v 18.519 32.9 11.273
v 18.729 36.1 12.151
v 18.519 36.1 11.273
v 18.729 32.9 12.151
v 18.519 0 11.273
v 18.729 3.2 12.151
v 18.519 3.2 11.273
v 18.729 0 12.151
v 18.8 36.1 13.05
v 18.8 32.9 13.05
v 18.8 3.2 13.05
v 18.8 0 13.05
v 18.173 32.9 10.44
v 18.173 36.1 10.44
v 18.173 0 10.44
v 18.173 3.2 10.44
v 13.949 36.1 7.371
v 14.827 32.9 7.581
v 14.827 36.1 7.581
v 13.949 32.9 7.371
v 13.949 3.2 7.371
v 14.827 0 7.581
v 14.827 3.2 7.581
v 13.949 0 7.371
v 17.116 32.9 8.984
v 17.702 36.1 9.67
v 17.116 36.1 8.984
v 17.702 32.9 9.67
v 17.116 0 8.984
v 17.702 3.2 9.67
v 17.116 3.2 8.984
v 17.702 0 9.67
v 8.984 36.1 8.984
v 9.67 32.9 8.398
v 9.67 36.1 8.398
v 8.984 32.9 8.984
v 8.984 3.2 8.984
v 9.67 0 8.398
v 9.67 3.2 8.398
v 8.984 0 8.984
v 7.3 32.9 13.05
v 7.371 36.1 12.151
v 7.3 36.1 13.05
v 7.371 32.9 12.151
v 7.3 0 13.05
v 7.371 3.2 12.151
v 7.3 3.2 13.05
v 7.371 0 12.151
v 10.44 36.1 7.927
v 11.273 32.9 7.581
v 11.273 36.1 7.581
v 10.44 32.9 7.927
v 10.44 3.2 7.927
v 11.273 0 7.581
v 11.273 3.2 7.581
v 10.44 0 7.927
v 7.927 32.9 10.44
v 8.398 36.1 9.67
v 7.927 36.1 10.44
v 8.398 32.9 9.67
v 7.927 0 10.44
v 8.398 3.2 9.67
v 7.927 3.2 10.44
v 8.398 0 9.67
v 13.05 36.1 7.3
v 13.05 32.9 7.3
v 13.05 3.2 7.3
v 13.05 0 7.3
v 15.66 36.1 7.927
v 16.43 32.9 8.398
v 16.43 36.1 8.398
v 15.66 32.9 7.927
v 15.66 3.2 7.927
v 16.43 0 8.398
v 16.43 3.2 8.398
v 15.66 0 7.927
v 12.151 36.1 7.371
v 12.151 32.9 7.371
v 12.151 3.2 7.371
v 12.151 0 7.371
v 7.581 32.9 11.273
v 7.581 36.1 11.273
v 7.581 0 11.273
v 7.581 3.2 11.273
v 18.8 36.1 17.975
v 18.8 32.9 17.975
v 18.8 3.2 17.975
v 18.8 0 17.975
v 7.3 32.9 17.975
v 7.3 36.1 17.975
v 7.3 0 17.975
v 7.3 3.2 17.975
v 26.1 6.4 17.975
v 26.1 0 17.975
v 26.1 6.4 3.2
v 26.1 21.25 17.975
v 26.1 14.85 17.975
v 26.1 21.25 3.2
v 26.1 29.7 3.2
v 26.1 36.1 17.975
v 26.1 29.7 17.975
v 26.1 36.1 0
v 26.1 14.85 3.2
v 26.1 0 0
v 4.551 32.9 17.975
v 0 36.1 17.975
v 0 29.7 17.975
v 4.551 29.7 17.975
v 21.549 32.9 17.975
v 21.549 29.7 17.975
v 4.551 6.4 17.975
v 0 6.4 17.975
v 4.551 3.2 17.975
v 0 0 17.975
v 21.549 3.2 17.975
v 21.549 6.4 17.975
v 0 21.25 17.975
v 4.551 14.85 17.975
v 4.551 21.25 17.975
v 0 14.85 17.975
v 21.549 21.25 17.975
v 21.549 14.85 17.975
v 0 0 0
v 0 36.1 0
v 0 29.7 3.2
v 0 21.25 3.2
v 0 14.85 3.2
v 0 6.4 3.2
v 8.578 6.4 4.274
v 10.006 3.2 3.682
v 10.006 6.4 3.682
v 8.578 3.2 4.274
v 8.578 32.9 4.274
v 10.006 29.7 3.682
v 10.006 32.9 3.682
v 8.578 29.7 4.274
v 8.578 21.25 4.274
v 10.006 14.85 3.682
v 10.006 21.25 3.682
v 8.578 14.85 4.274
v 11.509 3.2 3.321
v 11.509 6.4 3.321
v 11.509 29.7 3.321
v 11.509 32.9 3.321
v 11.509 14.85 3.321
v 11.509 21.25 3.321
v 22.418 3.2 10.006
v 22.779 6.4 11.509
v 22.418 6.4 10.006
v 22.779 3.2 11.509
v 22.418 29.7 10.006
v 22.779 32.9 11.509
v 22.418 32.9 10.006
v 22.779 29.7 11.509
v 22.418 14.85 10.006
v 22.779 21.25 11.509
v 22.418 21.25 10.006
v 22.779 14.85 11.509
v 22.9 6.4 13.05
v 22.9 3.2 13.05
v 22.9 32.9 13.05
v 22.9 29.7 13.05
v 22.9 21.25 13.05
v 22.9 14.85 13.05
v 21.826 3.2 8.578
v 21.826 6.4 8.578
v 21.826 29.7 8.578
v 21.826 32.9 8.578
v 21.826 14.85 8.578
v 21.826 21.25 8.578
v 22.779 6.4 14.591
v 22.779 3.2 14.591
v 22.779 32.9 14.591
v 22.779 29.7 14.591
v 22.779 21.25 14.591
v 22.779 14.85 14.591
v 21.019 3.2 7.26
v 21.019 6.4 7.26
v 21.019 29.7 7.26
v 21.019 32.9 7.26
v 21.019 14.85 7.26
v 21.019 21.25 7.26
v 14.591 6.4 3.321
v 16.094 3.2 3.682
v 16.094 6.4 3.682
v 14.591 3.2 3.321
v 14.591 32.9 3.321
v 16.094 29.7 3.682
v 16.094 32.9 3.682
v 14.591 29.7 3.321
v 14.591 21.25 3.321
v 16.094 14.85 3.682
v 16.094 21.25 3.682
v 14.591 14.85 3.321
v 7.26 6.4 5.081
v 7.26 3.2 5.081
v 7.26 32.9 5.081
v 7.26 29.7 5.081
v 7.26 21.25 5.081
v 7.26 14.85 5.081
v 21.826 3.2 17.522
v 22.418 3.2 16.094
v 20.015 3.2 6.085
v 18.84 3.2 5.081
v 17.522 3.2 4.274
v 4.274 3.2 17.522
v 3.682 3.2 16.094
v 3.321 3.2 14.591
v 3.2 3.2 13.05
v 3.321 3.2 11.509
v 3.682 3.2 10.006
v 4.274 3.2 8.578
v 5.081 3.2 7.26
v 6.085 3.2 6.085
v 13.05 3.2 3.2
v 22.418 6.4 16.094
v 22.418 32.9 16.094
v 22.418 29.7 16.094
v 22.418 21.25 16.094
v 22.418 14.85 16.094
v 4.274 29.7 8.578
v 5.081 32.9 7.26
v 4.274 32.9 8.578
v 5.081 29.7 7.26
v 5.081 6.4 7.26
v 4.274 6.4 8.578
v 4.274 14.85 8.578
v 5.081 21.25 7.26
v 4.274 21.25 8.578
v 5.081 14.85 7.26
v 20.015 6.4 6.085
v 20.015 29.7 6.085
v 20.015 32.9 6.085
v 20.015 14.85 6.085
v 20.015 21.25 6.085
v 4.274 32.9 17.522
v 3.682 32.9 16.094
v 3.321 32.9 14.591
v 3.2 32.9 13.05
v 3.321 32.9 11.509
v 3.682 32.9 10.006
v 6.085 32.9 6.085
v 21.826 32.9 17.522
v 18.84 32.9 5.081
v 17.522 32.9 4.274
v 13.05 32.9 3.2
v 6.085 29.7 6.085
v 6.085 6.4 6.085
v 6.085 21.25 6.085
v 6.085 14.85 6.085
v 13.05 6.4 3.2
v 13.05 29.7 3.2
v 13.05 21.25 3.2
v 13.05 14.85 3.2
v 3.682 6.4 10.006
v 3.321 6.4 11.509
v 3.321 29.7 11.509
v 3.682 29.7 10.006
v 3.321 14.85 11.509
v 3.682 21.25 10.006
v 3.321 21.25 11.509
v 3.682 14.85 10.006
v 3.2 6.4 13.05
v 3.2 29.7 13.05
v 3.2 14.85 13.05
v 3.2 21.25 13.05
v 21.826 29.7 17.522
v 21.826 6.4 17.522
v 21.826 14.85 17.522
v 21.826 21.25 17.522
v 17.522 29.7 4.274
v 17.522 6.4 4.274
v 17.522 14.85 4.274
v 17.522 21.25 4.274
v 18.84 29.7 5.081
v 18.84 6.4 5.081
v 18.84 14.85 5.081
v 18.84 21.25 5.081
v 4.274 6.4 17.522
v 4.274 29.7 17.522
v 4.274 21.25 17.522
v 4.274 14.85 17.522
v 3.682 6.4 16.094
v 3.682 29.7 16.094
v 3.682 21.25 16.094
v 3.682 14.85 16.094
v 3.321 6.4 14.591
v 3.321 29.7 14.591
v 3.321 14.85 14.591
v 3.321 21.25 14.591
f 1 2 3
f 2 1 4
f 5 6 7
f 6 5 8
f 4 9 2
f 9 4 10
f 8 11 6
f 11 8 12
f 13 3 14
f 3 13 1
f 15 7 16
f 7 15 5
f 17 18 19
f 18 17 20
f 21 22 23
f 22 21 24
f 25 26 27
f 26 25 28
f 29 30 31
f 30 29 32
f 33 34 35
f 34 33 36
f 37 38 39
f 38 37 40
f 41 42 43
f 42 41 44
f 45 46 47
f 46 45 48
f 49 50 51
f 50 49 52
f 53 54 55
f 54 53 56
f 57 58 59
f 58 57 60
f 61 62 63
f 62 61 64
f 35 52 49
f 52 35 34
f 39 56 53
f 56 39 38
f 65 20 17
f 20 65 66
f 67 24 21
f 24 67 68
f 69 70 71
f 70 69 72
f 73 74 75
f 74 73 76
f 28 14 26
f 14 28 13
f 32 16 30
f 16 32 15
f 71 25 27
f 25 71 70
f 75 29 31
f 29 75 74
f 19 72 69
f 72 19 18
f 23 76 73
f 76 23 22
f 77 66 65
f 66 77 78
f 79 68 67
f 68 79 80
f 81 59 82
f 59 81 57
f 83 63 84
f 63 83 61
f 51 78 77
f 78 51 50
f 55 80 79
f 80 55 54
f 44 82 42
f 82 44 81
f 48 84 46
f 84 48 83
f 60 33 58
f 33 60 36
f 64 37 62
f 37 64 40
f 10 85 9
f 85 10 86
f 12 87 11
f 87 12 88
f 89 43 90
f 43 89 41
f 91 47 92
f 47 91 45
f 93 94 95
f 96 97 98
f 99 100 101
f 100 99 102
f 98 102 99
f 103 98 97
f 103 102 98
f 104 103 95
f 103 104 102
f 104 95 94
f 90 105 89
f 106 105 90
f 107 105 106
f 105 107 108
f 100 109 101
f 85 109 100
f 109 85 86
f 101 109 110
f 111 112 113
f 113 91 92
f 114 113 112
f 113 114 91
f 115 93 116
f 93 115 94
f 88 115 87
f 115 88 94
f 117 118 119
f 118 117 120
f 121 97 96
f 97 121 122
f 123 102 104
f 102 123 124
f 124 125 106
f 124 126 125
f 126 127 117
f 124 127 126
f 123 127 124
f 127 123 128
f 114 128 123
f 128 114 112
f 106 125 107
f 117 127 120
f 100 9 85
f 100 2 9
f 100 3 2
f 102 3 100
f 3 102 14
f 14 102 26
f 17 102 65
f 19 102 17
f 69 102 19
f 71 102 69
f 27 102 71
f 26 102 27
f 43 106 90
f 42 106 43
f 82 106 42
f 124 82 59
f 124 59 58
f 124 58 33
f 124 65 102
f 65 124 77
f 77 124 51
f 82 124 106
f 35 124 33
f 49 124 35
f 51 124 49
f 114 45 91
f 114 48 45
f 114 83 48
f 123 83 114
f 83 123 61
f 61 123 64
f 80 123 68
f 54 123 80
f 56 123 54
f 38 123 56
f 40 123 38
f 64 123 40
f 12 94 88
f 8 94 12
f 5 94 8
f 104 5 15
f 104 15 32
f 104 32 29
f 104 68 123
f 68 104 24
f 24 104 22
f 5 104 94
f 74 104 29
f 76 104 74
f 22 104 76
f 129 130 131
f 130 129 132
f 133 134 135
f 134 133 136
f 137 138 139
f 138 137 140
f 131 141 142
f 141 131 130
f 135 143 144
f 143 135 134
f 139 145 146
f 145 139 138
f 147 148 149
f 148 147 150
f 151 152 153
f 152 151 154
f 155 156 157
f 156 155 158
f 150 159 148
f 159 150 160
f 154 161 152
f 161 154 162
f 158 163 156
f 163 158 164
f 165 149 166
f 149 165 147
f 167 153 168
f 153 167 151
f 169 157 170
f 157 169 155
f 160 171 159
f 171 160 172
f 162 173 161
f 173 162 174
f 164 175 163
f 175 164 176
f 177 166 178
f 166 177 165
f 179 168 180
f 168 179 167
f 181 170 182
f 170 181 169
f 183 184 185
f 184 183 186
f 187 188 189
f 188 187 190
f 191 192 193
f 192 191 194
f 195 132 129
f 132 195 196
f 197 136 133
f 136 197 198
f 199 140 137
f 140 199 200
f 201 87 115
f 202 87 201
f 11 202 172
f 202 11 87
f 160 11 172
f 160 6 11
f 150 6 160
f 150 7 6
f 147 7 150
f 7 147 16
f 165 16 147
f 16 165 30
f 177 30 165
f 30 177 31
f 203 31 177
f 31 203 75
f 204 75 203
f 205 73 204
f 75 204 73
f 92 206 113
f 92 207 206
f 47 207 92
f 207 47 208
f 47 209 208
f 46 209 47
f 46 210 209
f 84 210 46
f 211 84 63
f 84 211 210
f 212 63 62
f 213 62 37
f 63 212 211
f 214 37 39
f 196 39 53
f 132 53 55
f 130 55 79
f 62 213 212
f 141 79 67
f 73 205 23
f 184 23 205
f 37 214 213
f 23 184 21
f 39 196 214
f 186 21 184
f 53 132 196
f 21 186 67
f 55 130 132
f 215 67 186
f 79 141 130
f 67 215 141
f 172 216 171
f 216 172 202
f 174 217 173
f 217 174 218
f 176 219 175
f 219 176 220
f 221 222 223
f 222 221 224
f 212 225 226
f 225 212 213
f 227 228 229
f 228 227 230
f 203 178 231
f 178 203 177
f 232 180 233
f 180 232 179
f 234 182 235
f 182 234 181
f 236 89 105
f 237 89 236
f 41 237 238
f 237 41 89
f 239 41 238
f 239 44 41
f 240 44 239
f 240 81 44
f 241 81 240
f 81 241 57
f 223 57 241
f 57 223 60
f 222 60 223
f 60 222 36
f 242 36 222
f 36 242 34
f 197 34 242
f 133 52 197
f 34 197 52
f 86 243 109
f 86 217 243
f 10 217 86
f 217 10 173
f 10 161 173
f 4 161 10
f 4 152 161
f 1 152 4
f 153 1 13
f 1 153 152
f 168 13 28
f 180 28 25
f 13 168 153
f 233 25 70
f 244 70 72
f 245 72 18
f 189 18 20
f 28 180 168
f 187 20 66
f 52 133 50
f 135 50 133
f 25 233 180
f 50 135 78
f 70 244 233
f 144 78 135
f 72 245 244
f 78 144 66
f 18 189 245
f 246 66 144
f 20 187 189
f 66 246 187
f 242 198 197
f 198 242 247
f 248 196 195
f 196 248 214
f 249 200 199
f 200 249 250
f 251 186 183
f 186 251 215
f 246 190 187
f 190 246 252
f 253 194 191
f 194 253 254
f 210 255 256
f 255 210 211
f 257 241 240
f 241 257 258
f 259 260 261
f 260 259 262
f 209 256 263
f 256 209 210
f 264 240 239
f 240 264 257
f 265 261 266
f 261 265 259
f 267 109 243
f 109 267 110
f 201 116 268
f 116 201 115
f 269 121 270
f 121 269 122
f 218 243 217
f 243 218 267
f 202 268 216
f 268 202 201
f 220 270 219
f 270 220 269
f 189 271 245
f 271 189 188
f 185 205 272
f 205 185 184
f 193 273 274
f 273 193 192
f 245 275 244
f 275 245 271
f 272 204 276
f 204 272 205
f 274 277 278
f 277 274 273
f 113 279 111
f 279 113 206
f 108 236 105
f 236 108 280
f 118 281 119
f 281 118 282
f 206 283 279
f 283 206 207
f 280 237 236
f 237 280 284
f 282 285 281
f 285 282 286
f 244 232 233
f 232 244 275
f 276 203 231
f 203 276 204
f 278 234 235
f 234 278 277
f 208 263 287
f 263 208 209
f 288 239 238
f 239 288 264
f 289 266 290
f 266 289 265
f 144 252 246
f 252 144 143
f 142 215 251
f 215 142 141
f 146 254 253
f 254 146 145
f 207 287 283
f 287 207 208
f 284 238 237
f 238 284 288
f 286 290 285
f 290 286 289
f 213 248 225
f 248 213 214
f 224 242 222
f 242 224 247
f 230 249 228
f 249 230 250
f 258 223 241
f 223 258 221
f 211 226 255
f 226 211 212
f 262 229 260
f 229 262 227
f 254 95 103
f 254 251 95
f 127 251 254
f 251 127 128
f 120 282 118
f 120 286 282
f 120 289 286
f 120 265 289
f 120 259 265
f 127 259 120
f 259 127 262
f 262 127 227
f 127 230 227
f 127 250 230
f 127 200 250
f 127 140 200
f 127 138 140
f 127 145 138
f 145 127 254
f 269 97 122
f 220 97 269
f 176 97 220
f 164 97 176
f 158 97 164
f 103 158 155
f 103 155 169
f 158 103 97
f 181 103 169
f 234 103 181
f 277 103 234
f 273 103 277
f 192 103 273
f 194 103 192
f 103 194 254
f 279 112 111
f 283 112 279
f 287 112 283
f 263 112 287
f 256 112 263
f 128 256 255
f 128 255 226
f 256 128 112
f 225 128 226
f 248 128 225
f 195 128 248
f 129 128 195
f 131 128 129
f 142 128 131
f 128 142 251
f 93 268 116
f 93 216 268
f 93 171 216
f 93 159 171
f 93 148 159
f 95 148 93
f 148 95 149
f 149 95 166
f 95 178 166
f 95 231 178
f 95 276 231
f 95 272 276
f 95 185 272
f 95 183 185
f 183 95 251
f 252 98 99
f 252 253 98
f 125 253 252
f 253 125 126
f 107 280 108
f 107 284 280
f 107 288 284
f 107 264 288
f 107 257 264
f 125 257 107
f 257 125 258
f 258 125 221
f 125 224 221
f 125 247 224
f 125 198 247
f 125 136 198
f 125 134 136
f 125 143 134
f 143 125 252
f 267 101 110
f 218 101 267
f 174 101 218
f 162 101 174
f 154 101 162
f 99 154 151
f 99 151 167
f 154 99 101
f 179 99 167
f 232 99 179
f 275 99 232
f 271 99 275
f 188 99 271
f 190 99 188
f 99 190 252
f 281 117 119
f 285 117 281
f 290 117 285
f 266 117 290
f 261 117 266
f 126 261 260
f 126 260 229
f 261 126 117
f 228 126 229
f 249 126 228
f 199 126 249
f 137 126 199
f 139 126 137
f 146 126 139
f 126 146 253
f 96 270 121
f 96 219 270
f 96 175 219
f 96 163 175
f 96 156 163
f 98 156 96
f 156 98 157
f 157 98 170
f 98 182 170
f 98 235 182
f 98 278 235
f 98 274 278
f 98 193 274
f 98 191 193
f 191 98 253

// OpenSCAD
// Gregs PRUSA Mendel  
// X-carriage
// Used for sliding on X axis
// GNU GPL v2
// Greg Frost
// Modified by Djamuka
//https://github.com/GregFrost/PrusaMendel

//include <configuration.scad>
m8_diameter=10;
clearance=0.7;

lm10uu_diameter=19+clearance;
lm10uu_length=29+clearance;
lm10uu_support_thickness=3.2; 
lm10uu_end_diameter=m8_diameter+1.5;

lm10uu_holder_width=lm10uu_diameter+2*lm10uu_support_thickness;
lm10uu_holder_length=lm10uu_length+2*lm10uu_support_thickness;
lm10uu_holder_height=lm10uu_diameter*0.75+lm10uu_support_thickness;
lm10uu_holder_gap=(lm10uu_holder_length-6*lm10uu_support_thickness)/2;

module lm10uu_bearing_holder()
{
	difference()
	{
		cube([lm10uu_holder_width,lm10uu_holder_length,lm10uu_holder_height]);
		translate([lm10uu_holder_width/2,0,lm10uu_holder_width/2])
		rotate([-90,0,0])
		translate([0,0,lm10uu_support_thickness])
		cylinder(r=lm10uu_diameter/2,h=lm10uu_length,$fn=40);

		translate([lm10uu_holder_width/2,0,lm10uu_holder_width/2])
		rotate([-90,0,0])
		translate([0,0,-1])
		{
			cylinder(r=lm10uu_end_diameter/2,h=lm10uu_holder_length+2,$fn=40);
			translate([-lm10uu_end_diameter/2,-lm10uu_end_diameter,0])
			cube([lm10uu_end_diameter,lm10uu_end_diameter,lm10uu_holder_length+2]);
		}

		translate([-1,2*lm10uu_support_thickness,lm10uu_support_thickness])
		cube([lm10uu_holder_width+2,lm10uu_holder_gap,
			lm10uu_holder_height-lm10uu_support_thickness+1]);

		translate([-1,4*lm10uu_support_thickness+lm10uu_holder_gap,
			lm10uu_support_thickness])
		cube([lm10uu_holder_width+2,lm10uu_holder_gap,
			lm10uu_holder_height-lm10uu_support_thickness+1]);
	}
}

lm10uu_bearing_holder();
